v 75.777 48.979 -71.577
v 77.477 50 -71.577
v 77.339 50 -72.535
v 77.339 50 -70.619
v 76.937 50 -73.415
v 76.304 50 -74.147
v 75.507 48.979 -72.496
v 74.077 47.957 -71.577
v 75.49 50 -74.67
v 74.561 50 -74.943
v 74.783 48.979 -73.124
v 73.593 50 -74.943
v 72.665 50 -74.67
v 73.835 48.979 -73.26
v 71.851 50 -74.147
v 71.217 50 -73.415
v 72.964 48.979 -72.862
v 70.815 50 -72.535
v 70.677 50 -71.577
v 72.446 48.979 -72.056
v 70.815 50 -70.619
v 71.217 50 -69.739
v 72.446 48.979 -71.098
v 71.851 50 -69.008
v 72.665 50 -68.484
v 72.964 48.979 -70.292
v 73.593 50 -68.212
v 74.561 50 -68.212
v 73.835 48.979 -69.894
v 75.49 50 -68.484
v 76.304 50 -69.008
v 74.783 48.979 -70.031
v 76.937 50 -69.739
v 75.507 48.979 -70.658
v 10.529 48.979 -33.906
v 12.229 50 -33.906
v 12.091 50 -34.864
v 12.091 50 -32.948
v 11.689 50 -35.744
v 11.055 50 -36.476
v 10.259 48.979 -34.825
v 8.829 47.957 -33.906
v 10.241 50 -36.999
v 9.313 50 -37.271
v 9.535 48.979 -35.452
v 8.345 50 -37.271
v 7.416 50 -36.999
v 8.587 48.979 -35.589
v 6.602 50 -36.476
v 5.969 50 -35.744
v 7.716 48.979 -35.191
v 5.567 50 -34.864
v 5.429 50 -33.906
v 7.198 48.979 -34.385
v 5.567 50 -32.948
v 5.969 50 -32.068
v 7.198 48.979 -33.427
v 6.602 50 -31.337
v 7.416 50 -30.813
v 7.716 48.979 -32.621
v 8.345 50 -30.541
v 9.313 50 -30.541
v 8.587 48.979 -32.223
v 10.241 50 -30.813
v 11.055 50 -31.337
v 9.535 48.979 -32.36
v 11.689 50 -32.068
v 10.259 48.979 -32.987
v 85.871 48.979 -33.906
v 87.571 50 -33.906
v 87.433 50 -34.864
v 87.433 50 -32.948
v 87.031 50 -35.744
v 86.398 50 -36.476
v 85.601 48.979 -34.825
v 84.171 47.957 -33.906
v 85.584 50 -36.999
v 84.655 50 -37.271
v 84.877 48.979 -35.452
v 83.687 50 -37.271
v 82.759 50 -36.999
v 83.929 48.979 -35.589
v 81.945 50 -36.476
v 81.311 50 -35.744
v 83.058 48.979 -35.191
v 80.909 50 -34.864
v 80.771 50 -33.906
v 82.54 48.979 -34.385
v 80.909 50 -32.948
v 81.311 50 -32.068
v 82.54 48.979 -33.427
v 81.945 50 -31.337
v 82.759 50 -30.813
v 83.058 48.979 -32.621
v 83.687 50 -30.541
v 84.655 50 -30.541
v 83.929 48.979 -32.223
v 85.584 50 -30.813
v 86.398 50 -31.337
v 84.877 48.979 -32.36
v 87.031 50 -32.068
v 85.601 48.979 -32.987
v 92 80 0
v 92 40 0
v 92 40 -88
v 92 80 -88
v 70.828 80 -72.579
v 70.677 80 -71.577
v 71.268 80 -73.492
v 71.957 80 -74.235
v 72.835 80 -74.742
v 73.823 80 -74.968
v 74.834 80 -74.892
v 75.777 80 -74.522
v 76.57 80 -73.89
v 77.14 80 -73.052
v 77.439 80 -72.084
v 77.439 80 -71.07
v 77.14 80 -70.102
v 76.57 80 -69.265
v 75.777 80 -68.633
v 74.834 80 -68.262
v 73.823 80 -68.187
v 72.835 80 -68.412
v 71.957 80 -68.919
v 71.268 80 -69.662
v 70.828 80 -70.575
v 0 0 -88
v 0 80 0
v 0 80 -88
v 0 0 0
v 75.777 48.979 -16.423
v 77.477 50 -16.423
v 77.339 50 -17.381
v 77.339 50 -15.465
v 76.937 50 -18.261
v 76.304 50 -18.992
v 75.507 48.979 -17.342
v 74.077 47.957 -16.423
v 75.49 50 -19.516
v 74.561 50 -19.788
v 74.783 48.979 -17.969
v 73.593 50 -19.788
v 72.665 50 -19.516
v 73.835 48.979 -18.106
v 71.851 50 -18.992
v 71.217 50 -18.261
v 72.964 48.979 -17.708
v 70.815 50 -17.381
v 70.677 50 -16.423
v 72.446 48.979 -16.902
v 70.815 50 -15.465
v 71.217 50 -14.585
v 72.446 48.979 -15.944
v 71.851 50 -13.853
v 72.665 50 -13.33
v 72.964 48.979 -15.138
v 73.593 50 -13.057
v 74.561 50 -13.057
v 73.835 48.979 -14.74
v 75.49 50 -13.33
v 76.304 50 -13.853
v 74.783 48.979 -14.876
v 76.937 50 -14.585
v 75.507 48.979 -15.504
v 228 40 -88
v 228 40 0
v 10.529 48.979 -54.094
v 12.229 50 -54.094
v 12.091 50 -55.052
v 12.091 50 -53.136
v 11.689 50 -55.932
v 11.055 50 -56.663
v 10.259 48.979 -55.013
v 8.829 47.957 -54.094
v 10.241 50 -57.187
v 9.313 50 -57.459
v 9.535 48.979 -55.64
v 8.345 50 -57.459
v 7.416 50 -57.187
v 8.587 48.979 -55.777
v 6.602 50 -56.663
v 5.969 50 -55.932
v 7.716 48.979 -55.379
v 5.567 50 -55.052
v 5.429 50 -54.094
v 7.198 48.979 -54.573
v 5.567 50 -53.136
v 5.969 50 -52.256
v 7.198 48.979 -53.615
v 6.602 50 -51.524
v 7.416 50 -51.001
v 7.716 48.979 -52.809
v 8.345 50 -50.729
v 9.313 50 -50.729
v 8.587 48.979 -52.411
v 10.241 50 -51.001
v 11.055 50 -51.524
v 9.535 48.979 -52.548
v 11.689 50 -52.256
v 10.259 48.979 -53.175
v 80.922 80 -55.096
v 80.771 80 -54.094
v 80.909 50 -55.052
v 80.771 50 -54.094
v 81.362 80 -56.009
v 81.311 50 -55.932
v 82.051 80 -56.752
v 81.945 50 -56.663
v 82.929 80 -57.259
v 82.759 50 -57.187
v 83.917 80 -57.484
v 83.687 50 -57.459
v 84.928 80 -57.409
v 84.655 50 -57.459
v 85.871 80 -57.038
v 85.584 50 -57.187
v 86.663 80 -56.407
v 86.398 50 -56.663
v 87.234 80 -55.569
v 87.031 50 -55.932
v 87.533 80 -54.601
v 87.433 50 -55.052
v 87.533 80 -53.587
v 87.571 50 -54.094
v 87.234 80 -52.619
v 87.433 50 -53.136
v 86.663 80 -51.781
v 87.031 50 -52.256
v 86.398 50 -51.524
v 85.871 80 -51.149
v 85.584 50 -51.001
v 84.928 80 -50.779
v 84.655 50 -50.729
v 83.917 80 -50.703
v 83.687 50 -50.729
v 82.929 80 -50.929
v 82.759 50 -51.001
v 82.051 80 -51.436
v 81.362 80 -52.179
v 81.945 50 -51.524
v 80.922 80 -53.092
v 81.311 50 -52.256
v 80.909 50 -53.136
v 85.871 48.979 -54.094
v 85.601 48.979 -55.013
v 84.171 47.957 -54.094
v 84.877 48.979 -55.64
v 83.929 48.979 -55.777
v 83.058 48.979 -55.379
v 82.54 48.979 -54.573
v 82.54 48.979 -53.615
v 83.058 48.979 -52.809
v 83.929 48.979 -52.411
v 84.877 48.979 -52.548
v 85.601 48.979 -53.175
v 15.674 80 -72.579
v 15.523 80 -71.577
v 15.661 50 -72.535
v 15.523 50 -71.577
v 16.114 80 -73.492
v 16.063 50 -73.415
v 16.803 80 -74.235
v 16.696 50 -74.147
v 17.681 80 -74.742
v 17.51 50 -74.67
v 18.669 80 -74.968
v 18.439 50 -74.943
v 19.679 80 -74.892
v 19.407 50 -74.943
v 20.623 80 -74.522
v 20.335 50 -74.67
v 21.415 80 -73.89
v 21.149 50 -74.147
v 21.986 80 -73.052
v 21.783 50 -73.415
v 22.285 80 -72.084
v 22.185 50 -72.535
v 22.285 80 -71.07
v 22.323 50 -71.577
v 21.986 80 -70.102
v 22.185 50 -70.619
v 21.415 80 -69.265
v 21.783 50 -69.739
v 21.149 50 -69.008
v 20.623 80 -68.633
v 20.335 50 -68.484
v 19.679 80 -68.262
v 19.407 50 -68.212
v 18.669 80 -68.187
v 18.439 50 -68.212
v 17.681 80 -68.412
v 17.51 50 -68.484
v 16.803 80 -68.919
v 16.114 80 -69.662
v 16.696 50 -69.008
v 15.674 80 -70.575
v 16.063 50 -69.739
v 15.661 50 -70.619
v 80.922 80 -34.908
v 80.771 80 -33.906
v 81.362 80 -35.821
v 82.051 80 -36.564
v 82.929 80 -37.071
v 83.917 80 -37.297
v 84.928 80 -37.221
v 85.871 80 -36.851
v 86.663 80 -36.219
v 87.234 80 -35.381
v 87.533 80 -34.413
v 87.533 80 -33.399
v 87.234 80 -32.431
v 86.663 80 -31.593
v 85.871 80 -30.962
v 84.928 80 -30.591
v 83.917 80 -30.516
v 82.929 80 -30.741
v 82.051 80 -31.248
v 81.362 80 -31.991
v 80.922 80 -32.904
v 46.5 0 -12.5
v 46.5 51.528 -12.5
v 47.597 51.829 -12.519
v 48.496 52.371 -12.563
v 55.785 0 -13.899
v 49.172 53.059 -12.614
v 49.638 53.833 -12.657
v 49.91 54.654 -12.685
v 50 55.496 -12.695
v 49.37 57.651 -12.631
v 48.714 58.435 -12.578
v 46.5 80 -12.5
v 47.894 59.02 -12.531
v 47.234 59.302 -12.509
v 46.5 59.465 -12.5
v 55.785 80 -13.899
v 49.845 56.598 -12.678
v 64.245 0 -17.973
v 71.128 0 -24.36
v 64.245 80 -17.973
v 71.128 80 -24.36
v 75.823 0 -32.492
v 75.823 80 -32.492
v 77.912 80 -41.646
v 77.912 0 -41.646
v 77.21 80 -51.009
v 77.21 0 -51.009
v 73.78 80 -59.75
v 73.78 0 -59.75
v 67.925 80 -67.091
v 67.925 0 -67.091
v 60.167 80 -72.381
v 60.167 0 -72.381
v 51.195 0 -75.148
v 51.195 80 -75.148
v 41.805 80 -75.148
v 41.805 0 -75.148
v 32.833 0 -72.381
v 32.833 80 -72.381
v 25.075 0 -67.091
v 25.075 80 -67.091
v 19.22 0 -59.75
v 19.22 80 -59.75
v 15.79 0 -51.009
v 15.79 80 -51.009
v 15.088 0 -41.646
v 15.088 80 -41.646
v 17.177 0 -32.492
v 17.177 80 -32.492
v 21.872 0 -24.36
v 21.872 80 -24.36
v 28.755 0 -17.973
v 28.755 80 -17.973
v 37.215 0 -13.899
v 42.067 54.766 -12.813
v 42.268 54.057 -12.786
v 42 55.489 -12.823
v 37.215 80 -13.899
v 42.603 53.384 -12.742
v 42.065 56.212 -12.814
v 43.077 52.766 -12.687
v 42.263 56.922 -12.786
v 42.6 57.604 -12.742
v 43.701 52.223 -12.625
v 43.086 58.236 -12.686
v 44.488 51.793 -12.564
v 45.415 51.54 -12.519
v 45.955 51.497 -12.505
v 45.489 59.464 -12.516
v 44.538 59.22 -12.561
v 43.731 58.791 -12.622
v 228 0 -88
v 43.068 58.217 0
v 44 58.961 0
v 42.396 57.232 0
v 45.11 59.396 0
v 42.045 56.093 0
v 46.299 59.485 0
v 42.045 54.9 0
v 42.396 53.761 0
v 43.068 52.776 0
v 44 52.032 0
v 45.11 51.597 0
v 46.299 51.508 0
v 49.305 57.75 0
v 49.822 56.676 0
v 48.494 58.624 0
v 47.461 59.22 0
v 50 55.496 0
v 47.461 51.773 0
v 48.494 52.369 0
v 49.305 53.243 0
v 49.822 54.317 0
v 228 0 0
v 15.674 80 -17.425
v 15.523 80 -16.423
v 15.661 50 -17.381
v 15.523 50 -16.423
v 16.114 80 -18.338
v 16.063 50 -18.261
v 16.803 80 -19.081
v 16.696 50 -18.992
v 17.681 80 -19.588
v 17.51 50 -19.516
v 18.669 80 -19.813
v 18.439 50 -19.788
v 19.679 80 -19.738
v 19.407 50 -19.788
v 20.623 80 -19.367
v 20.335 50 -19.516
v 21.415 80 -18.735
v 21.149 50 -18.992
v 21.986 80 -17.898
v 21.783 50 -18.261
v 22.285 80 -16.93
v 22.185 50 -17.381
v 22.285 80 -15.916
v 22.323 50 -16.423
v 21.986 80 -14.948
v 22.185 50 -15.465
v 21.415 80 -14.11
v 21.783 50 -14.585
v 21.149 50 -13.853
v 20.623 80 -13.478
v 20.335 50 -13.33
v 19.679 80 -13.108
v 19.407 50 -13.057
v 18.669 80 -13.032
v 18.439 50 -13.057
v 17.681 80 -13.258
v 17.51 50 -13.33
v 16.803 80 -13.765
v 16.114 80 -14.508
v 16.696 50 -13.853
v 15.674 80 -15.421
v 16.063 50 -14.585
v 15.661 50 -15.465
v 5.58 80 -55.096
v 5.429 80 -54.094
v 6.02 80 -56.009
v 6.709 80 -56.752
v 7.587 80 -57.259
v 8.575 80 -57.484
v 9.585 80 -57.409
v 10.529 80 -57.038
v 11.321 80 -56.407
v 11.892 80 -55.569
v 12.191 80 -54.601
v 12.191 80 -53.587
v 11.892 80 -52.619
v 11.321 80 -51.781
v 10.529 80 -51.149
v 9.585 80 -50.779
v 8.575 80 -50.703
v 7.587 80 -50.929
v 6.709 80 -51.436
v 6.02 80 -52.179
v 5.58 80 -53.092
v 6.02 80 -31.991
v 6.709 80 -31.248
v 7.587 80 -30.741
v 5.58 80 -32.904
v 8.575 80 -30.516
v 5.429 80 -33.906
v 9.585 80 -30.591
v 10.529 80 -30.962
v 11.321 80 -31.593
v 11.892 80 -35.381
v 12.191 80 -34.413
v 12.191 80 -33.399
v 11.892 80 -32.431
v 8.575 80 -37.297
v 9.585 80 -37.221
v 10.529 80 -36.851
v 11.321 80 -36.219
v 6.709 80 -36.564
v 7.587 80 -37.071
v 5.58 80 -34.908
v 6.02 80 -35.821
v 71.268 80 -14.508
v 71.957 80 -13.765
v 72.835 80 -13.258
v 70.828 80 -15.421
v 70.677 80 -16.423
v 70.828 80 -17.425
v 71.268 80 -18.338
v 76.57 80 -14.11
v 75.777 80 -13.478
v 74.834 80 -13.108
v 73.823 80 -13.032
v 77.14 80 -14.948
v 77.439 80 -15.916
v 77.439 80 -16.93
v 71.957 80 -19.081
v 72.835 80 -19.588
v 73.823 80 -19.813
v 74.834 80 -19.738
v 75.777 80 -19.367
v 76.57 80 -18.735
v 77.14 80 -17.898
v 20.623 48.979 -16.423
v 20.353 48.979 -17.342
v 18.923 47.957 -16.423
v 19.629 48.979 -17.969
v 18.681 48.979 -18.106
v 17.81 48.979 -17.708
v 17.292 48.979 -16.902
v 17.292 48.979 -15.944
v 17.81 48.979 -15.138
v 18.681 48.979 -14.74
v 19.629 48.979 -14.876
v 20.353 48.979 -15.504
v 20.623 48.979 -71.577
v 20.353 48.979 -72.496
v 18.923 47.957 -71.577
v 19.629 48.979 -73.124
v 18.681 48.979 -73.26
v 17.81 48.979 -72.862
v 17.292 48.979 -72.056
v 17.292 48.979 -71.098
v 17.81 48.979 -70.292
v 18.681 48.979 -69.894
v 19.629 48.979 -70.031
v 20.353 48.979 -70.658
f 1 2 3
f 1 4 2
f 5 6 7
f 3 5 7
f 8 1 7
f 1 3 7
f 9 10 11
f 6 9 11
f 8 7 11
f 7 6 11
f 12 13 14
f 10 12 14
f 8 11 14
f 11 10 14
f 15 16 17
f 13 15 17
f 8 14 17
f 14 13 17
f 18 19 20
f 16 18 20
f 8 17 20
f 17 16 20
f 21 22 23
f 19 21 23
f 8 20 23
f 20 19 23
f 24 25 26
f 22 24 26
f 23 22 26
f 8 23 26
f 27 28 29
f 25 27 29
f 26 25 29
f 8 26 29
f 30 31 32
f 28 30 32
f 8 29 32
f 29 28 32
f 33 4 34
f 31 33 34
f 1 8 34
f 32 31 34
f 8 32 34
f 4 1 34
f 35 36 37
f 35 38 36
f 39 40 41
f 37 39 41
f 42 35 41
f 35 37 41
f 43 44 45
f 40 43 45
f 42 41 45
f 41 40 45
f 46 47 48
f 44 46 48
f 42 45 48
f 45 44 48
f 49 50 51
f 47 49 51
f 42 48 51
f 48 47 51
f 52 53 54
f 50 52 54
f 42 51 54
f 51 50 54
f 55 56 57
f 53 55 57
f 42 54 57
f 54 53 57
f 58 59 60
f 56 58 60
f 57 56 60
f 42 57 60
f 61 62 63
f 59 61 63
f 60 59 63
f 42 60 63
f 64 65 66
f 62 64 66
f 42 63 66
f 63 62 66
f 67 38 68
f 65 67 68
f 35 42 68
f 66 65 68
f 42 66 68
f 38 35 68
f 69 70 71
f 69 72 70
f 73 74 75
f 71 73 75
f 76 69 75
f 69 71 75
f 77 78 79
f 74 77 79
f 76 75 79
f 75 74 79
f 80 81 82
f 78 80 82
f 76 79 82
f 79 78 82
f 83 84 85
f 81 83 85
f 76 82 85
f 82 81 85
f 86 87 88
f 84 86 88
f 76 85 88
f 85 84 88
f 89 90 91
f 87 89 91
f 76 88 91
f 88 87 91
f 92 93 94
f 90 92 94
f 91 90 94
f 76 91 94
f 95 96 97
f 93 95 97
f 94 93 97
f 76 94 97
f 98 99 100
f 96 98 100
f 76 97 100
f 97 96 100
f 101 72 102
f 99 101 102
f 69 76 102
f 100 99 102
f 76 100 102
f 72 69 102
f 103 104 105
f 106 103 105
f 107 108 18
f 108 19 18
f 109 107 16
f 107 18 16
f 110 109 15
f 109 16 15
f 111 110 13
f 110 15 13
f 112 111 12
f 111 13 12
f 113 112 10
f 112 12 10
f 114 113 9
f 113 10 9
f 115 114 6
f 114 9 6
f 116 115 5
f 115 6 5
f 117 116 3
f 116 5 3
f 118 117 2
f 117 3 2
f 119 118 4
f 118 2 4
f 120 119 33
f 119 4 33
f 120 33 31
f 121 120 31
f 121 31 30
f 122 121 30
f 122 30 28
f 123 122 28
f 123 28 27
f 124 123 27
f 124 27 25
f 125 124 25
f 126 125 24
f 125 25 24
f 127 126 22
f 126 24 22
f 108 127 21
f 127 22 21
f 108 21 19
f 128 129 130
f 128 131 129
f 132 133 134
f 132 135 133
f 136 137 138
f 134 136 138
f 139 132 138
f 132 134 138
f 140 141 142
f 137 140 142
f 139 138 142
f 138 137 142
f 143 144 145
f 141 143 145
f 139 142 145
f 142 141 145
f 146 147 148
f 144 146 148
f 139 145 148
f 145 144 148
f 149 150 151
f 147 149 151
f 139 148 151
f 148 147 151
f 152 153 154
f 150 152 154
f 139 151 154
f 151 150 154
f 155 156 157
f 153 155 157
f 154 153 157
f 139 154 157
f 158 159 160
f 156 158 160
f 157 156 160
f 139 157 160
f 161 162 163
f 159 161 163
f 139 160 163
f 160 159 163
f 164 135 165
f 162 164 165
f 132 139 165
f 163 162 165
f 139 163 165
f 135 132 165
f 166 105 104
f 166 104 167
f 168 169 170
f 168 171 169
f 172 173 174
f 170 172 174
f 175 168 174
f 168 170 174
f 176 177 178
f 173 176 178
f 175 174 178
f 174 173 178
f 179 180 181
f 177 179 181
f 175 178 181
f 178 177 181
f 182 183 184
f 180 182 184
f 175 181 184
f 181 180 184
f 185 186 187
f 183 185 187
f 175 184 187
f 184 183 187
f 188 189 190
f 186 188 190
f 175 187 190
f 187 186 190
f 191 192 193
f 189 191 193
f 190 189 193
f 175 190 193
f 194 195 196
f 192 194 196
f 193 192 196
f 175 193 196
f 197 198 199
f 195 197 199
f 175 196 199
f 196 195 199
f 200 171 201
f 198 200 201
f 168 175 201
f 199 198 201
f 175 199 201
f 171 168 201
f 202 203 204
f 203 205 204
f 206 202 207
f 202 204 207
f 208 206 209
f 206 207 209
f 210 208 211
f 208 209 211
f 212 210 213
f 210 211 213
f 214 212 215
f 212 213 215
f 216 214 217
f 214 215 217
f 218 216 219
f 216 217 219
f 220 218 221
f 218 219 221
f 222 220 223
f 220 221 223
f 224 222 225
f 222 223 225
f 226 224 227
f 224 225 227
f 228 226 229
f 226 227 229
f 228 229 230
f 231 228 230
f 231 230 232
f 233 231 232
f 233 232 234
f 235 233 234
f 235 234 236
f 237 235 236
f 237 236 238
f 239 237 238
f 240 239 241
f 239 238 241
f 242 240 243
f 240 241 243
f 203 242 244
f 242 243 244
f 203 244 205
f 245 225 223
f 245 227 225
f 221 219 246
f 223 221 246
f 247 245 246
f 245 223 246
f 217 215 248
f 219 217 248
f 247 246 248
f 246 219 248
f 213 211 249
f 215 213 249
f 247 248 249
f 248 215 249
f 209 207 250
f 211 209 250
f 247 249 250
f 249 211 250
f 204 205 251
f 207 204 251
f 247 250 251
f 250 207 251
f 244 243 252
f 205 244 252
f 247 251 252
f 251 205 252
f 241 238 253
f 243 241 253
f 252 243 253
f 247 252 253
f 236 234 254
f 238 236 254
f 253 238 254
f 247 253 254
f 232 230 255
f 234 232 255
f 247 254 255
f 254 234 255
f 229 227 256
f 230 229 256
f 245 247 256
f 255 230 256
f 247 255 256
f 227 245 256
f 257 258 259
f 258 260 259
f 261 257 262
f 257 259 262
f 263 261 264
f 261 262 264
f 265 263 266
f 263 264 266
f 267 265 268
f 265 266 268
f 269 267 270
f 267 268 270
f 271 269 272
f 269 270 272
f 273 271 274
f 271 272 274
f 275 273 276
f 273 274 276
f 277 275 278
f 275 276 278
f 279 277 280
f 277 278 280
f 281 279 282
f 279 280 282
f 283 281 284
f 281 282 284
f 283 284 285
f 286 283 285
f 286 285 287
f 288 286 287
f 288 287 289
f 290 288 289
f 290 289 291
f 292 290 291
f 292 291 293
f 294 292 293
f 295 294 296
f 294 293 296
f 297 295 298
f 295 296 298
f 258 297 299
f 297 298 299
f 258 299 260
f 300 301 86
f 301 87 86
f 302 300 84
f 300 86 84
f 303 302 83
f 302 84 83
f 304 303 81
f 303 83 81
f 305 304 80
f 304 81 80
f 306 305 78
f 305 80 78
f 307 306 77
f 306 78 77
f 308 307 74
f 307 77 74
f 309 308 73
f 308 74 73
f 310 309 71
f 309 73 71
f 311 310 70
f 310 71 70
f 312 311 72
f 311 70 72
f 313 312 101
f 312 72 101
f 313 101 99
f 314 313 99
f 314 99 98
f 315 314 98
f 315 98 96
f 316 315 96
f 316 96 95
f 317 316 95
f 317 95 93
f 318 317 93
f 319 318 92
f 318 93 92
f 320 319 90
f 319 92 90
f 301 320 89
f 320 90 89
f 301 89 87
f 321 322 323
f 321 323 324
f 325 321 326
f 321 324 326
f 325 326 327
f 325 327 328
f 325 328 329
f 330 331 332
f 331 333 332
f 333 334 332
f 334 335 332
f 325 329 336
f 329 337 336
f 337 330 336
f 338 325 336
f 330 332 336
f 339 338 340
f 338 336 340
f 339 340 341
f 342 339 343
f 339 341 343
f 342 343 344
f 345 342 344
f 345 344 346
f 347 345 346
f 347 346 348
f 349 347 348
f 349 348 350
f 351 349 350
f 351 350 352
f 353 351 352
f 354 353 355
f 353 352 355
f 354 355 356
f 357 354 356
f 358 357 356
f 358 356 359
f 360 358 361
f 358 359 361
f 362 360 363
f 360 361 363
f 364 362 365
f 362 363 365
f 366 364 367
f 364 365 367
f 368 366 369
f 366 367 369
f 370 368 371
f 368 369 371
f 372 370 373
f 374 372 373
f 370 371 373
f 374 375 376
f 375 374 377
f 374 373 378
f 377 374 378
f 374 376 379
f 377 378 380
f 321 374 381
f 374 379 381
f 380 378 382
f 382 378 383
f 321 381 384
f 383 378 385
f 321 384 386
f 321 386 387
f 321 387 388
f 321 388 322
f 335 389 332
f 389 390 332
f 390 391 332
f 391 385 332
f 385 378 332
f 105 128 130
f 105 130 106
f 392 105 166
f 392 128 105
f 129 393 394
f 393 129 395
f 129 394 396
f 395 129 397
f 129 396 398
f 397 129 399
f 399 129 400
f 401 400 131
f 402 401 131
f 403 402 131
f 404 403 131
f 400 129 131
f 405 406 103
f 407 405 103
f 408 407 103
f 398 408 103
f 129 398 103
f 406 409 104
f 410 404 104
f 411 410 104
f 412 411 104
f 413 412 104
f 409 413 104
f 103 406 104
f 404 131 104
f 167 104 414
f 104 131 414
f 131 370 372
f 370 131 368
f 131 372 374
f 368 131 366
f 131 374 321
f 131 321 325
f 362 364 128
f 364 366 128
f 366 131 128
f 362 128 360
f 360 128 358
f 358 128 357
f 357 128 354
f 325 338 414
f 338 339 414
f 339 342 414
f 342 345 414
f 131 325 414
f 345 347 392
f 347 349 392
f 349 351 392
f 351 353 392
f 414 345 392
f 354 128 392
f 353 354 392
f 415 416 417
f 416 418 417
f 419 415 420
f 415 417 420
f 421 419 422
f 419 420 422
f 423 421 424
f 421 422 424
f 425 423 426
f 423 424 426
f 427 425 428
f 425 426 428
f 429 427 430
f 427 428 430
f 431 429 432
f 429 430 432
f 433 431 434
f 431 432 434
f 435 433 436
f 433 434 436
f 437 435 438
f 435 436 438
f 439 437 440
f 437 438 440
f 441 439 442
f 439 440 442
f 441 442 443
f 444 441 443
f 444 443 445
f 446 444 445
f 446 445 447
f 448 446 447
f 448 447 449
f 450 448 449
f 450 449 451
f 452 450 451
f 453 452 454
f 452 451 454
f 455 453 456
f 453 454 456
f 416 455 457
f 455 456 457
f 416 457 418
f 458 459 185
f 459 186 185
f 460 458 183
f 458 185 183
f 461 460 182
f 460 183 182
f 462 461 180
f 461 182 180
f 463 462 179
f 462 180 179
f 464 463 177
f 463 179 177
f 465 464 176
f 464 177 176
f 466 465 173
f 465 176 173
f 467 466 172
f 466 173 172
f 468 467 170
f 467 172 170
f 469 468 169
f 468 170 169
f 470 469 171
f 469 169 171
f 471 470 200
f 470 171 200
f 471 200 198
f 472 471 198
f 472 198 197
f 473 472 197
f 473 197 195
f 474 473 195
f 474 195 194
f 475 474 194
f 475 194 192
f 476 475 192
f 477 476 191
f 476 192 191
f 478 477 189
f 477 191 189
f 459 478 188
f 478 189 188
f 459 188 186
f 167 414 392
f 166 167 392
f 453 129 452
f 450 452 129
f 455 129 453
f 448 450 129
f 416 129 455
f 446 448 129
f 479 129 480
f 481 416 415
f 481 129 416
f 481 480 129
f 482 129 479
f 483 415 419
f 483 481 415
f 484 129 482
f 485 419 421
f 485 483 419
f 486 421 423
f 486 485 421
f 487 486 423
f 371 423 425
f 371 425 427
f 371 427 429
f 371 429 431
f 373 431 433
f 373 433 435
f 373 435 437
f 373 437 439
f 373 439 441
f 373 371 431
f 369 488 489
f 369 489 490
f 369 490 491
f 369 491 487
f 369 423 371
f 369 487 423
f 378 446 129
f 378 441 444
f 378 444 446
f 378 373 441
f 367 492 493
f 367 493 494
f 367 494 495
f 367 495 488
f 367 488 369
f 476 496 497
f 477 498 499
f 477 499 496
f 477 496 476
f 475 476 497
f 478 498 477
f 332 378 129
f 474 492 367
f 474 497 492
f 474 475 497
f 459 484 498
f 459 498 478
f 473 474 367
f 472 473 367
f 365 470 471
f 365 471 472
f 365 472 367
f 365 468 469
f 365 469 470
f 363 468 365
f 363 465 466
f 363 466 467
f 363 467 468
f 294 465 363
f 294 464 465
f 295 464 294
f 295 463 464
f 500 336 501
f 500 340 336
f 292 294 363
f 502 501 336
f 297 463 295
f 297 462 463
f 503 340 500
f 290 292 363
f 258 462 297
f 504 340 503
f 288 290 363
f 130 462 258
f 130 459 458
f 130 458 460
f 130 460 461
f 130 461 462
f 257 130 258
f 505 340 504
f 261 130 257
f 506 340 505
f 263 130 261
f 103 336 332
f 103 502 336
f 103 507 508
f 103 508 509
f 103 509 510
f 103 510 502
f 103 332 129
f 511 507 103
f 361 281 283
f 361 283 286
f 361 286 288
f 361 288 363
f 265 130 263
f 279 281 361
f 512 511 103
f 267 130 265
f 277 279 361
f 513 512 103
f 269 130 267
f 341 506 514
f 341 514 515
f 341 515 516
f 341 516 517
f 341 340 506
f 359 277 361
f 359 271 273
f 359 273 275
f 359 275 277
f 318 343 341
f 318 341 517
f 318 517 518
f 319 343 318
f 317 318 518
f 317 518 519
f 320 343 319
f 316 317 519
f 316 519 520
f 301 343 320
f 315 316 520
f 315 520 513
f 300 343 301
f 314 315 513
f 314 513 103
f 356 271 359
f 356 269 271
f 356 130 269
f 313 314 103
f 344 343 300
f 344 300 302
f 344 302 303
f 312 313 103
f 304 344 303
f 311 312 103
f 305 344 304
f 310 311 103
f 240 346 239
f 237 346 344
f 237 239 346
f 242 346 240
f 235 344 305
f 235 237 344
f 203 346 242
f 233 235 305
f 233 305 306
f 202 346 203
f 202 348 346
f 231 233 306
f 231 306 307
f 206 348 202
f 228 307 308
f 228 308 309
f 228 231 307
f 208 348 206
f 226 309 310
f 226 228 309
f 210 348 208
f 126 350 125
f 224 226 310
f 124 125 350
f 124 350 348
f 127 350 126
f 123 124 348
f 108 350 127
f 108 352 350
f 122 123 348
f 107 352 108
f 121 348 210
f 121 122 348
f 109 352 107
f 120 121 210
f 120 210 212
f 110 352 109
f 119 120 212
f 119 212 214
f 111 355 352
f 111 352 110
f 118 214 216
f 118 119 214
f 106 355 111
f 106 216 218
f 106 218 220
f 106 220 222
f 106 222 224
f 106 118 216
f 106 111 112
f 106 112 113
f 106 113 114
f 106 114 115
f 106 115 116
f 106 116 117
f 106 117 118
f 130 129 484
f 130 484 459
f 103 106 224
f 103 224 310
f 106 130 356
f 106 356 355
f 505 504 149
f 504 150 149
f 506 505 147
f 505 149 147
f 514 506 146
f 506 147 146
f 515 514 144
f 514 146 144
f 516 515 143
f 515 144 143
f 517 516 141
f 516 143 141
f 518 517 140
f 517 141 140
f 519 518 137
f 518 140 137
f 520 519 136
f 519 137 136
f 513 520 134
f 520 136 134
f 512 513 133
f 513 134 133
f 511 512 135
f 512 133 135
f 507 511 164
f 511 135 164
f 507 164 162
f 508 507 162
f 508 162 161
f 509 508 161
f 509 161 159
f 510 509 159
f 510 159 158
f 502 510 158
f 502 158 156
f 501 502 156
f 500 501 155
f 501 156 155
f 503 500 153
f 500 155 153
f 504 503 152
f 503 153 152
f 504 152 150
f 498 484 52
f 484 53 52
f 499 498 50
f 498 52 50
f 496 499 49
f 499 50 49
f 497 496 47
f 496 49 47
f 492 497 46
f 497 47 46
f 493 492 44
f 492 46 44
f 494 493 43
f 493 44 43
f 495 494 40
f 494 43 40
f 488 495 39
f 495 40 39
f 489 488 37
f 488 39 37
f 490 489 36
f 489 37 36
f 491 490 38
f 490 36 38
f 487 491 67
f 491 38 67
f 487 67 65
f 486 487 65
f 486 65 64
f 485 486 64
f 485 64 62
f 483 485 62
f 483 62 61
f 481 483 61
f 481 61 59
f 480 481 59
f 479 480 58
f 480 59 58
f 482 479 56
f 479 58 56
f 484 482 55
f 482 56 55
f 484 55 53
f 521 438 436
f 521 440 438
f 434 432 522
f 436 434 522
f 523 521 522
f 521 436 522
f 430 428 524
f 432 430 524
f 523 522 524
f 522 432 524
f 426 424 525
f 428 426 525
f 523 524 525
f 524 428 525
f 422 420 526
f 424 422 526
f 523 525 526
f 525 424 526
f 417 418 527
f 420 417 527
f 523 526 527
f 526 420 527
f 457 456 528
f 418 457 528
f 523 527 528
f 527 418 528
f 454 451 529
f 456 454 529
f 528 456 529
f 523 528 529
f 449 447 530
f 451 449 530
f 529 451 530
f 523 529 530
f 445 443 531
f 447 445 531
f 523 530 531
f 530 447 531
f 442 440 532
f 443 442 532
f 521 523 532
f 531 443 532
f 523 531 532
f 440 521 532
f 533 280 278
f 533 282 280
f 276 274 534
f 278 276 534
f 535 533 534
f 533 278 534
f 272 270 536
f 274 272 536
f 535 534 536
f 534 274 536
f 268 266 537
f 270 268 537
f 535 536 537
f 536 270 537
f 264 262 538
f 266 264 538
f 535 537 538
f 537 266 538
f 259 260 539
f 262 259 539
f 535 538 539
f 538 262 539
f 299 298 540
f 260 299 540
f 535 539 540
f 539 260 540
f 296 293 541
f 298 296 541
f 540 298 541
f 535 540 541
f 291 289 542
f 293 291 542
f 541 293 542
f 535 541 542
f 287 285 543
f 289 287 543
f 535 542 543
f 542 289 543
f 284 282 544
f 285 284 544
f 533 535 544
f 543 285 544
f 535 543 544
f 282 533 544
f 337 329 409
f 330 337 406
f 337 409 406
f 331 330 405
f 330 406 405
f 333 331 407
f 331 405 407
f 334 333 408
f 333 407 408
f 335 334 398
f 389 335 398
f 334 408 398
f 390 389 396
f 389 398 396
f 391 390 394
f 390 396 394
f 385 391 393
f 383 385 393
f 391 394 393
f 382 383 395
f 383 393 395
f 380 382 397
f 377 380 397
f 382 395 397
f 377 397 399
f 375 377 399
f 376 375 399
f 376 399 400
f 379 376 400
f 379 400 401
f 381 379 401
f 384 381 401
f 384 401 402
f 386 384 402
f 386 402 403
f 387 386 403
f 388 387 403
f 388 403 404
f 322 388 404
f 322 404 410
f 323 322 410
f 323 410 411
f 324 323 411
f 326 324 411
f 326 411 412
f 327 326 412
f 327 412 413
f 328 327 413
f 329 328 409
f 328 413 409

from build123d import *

# Parameters (mm, degrees)
SKETCH_2_W               = 228
SKETCH_2_H               = 88
EXTRUDE_1_DEPTH          = 40
SKETCH_3_W               = 92
SKETCH_3_H               = 88
EXTRUDE_2_DEPTH          = 40
CUT_EXTRUDE_1_REACH      = 259.154
SKETCH_4_R               = 31.5
HOLE_WIZARD_M8_3_D       = 6.8
HOLE_WIZARD_M8_3_DEPTH   = 30
HOLE_WIZARD_M8_3_TIP     = 2.042926105
CUT_EXTRUDE_3_REACH      = 259.154
CUT_EXTRUDE_3_END_RADIUS = 31.5
SKETCH_8_R               = 4


with BuildPart() as part:
    # 草图2 → 凸台-拉伸1 (new body)
    with BuildSketch(Plane(origin=(0, 0, 0), x_dir=(1, 0, 0), z_dir=(0, 1, 0))):
        with Locations((114, 44)):
            Rectangle(SKETCH_2_W, SKETCH_2_H)
    extrude(amount=EXTRUDE_1_DEPTH)

    # 草图3 → 凸台-拉伸2 (add)
    with BuildSketch(Plane(origin=(0, 40, 0), x_dir=(1, 0, 0), z_dir=(0, 1, 0))):
        with Locations((46, 44)):
            Rectangle(SKETCH_3_W, SKETCH_3_H)
    extrude(amount=EXTRUDE_2_DEPTH)

    # 草图4 → 切除-拉伸1 (cut, up to next)
    with BuildSketch(Plane(origin=(0, 80, 0), x_dir=(1, 0, 0), z_dir=(0, 1, 0)), mode=Mode.PRIVATE) as cut_extrude_1_sk1:
        with Locations(Location((46.5, 44, 0), (0, 0, 270))):
            Circle(SKETCH_4_R)
    cut_extrude_1_tool1 = extrude(cut_extrude_1_sk1.sketch, amount=-CUT_EXTRUDE_1_REACH, mode=Mode.PRIVATE) & part.part
    add(cut_extrude_1_tool1.solids().sort_by_distance((46.5, 80, -44))[0], mode=Mode.SUBTRACT)

    # M8 螺纹孔3
    with Locations(Plane(origin=(0, 80, 0), x_dir=(1, 0, 0), z_dir=(0, 1, 0))):
        with Locations((74.077164466, 71.577164466), (8.828892775, 54.093942759), (18.922835534, 16.422835534), (8.828892775, 33.906057241), (74.077164466, 16.422835534), (18.922835534, 71.577164466), (84.171107225, 33.906057241), (84.171107225, 54.093942759)):
            Hole(HOLE_WIZARD_M8_3_D / 2, depth=HOLE_WIZARD_M8_3_DEPTH)
            with Locations((0, 0, -(HOLE_WIZARD_M8_3_DEPTH + HOLE_WIZARD_M8_3_TIP / 2))):  # 118° drill point
                Cone(0, HOLE_WIZARD_M8_3_D / 2, HOLE_WIZARD_M8_3_TIP, mode=Mode.SUBTRACT)

    # 切除-拉伸3: up to this cylinder (the profile starts outside it)
    cut_extrude_3_end = Plane(origin=(46.5, 55.496491, -44), z_dir=(0, 1, 0)) * Cylinder(CUT_EXTRUDE_3_END_RADIUS, 582.308, mode=Mode.PRIVATE)
    # 草图8 → 切除-拉伸3 (cut, up to the surface)
    with BuildSketch(Plane.XY, mode=Mode.PRIVATE) as cut_extrude_3_sk1:
        with Locations((46, 55.496491008)):
            Circle(SKETCH_8_R)
    cut_extrude_3_tool1 = extrude(cut_extrude_3_sk1.sketch, amount=-CUT_EXTRUDE_3_REACH, mode=Mode.PRIVATE) - cut_extrude_3_end
    add(cut_extrude_3_tool1.solids().sort_by_distance((46, 55.496491, 0))[0], mode=Mode.SUBTRACT)


solid = part.part
